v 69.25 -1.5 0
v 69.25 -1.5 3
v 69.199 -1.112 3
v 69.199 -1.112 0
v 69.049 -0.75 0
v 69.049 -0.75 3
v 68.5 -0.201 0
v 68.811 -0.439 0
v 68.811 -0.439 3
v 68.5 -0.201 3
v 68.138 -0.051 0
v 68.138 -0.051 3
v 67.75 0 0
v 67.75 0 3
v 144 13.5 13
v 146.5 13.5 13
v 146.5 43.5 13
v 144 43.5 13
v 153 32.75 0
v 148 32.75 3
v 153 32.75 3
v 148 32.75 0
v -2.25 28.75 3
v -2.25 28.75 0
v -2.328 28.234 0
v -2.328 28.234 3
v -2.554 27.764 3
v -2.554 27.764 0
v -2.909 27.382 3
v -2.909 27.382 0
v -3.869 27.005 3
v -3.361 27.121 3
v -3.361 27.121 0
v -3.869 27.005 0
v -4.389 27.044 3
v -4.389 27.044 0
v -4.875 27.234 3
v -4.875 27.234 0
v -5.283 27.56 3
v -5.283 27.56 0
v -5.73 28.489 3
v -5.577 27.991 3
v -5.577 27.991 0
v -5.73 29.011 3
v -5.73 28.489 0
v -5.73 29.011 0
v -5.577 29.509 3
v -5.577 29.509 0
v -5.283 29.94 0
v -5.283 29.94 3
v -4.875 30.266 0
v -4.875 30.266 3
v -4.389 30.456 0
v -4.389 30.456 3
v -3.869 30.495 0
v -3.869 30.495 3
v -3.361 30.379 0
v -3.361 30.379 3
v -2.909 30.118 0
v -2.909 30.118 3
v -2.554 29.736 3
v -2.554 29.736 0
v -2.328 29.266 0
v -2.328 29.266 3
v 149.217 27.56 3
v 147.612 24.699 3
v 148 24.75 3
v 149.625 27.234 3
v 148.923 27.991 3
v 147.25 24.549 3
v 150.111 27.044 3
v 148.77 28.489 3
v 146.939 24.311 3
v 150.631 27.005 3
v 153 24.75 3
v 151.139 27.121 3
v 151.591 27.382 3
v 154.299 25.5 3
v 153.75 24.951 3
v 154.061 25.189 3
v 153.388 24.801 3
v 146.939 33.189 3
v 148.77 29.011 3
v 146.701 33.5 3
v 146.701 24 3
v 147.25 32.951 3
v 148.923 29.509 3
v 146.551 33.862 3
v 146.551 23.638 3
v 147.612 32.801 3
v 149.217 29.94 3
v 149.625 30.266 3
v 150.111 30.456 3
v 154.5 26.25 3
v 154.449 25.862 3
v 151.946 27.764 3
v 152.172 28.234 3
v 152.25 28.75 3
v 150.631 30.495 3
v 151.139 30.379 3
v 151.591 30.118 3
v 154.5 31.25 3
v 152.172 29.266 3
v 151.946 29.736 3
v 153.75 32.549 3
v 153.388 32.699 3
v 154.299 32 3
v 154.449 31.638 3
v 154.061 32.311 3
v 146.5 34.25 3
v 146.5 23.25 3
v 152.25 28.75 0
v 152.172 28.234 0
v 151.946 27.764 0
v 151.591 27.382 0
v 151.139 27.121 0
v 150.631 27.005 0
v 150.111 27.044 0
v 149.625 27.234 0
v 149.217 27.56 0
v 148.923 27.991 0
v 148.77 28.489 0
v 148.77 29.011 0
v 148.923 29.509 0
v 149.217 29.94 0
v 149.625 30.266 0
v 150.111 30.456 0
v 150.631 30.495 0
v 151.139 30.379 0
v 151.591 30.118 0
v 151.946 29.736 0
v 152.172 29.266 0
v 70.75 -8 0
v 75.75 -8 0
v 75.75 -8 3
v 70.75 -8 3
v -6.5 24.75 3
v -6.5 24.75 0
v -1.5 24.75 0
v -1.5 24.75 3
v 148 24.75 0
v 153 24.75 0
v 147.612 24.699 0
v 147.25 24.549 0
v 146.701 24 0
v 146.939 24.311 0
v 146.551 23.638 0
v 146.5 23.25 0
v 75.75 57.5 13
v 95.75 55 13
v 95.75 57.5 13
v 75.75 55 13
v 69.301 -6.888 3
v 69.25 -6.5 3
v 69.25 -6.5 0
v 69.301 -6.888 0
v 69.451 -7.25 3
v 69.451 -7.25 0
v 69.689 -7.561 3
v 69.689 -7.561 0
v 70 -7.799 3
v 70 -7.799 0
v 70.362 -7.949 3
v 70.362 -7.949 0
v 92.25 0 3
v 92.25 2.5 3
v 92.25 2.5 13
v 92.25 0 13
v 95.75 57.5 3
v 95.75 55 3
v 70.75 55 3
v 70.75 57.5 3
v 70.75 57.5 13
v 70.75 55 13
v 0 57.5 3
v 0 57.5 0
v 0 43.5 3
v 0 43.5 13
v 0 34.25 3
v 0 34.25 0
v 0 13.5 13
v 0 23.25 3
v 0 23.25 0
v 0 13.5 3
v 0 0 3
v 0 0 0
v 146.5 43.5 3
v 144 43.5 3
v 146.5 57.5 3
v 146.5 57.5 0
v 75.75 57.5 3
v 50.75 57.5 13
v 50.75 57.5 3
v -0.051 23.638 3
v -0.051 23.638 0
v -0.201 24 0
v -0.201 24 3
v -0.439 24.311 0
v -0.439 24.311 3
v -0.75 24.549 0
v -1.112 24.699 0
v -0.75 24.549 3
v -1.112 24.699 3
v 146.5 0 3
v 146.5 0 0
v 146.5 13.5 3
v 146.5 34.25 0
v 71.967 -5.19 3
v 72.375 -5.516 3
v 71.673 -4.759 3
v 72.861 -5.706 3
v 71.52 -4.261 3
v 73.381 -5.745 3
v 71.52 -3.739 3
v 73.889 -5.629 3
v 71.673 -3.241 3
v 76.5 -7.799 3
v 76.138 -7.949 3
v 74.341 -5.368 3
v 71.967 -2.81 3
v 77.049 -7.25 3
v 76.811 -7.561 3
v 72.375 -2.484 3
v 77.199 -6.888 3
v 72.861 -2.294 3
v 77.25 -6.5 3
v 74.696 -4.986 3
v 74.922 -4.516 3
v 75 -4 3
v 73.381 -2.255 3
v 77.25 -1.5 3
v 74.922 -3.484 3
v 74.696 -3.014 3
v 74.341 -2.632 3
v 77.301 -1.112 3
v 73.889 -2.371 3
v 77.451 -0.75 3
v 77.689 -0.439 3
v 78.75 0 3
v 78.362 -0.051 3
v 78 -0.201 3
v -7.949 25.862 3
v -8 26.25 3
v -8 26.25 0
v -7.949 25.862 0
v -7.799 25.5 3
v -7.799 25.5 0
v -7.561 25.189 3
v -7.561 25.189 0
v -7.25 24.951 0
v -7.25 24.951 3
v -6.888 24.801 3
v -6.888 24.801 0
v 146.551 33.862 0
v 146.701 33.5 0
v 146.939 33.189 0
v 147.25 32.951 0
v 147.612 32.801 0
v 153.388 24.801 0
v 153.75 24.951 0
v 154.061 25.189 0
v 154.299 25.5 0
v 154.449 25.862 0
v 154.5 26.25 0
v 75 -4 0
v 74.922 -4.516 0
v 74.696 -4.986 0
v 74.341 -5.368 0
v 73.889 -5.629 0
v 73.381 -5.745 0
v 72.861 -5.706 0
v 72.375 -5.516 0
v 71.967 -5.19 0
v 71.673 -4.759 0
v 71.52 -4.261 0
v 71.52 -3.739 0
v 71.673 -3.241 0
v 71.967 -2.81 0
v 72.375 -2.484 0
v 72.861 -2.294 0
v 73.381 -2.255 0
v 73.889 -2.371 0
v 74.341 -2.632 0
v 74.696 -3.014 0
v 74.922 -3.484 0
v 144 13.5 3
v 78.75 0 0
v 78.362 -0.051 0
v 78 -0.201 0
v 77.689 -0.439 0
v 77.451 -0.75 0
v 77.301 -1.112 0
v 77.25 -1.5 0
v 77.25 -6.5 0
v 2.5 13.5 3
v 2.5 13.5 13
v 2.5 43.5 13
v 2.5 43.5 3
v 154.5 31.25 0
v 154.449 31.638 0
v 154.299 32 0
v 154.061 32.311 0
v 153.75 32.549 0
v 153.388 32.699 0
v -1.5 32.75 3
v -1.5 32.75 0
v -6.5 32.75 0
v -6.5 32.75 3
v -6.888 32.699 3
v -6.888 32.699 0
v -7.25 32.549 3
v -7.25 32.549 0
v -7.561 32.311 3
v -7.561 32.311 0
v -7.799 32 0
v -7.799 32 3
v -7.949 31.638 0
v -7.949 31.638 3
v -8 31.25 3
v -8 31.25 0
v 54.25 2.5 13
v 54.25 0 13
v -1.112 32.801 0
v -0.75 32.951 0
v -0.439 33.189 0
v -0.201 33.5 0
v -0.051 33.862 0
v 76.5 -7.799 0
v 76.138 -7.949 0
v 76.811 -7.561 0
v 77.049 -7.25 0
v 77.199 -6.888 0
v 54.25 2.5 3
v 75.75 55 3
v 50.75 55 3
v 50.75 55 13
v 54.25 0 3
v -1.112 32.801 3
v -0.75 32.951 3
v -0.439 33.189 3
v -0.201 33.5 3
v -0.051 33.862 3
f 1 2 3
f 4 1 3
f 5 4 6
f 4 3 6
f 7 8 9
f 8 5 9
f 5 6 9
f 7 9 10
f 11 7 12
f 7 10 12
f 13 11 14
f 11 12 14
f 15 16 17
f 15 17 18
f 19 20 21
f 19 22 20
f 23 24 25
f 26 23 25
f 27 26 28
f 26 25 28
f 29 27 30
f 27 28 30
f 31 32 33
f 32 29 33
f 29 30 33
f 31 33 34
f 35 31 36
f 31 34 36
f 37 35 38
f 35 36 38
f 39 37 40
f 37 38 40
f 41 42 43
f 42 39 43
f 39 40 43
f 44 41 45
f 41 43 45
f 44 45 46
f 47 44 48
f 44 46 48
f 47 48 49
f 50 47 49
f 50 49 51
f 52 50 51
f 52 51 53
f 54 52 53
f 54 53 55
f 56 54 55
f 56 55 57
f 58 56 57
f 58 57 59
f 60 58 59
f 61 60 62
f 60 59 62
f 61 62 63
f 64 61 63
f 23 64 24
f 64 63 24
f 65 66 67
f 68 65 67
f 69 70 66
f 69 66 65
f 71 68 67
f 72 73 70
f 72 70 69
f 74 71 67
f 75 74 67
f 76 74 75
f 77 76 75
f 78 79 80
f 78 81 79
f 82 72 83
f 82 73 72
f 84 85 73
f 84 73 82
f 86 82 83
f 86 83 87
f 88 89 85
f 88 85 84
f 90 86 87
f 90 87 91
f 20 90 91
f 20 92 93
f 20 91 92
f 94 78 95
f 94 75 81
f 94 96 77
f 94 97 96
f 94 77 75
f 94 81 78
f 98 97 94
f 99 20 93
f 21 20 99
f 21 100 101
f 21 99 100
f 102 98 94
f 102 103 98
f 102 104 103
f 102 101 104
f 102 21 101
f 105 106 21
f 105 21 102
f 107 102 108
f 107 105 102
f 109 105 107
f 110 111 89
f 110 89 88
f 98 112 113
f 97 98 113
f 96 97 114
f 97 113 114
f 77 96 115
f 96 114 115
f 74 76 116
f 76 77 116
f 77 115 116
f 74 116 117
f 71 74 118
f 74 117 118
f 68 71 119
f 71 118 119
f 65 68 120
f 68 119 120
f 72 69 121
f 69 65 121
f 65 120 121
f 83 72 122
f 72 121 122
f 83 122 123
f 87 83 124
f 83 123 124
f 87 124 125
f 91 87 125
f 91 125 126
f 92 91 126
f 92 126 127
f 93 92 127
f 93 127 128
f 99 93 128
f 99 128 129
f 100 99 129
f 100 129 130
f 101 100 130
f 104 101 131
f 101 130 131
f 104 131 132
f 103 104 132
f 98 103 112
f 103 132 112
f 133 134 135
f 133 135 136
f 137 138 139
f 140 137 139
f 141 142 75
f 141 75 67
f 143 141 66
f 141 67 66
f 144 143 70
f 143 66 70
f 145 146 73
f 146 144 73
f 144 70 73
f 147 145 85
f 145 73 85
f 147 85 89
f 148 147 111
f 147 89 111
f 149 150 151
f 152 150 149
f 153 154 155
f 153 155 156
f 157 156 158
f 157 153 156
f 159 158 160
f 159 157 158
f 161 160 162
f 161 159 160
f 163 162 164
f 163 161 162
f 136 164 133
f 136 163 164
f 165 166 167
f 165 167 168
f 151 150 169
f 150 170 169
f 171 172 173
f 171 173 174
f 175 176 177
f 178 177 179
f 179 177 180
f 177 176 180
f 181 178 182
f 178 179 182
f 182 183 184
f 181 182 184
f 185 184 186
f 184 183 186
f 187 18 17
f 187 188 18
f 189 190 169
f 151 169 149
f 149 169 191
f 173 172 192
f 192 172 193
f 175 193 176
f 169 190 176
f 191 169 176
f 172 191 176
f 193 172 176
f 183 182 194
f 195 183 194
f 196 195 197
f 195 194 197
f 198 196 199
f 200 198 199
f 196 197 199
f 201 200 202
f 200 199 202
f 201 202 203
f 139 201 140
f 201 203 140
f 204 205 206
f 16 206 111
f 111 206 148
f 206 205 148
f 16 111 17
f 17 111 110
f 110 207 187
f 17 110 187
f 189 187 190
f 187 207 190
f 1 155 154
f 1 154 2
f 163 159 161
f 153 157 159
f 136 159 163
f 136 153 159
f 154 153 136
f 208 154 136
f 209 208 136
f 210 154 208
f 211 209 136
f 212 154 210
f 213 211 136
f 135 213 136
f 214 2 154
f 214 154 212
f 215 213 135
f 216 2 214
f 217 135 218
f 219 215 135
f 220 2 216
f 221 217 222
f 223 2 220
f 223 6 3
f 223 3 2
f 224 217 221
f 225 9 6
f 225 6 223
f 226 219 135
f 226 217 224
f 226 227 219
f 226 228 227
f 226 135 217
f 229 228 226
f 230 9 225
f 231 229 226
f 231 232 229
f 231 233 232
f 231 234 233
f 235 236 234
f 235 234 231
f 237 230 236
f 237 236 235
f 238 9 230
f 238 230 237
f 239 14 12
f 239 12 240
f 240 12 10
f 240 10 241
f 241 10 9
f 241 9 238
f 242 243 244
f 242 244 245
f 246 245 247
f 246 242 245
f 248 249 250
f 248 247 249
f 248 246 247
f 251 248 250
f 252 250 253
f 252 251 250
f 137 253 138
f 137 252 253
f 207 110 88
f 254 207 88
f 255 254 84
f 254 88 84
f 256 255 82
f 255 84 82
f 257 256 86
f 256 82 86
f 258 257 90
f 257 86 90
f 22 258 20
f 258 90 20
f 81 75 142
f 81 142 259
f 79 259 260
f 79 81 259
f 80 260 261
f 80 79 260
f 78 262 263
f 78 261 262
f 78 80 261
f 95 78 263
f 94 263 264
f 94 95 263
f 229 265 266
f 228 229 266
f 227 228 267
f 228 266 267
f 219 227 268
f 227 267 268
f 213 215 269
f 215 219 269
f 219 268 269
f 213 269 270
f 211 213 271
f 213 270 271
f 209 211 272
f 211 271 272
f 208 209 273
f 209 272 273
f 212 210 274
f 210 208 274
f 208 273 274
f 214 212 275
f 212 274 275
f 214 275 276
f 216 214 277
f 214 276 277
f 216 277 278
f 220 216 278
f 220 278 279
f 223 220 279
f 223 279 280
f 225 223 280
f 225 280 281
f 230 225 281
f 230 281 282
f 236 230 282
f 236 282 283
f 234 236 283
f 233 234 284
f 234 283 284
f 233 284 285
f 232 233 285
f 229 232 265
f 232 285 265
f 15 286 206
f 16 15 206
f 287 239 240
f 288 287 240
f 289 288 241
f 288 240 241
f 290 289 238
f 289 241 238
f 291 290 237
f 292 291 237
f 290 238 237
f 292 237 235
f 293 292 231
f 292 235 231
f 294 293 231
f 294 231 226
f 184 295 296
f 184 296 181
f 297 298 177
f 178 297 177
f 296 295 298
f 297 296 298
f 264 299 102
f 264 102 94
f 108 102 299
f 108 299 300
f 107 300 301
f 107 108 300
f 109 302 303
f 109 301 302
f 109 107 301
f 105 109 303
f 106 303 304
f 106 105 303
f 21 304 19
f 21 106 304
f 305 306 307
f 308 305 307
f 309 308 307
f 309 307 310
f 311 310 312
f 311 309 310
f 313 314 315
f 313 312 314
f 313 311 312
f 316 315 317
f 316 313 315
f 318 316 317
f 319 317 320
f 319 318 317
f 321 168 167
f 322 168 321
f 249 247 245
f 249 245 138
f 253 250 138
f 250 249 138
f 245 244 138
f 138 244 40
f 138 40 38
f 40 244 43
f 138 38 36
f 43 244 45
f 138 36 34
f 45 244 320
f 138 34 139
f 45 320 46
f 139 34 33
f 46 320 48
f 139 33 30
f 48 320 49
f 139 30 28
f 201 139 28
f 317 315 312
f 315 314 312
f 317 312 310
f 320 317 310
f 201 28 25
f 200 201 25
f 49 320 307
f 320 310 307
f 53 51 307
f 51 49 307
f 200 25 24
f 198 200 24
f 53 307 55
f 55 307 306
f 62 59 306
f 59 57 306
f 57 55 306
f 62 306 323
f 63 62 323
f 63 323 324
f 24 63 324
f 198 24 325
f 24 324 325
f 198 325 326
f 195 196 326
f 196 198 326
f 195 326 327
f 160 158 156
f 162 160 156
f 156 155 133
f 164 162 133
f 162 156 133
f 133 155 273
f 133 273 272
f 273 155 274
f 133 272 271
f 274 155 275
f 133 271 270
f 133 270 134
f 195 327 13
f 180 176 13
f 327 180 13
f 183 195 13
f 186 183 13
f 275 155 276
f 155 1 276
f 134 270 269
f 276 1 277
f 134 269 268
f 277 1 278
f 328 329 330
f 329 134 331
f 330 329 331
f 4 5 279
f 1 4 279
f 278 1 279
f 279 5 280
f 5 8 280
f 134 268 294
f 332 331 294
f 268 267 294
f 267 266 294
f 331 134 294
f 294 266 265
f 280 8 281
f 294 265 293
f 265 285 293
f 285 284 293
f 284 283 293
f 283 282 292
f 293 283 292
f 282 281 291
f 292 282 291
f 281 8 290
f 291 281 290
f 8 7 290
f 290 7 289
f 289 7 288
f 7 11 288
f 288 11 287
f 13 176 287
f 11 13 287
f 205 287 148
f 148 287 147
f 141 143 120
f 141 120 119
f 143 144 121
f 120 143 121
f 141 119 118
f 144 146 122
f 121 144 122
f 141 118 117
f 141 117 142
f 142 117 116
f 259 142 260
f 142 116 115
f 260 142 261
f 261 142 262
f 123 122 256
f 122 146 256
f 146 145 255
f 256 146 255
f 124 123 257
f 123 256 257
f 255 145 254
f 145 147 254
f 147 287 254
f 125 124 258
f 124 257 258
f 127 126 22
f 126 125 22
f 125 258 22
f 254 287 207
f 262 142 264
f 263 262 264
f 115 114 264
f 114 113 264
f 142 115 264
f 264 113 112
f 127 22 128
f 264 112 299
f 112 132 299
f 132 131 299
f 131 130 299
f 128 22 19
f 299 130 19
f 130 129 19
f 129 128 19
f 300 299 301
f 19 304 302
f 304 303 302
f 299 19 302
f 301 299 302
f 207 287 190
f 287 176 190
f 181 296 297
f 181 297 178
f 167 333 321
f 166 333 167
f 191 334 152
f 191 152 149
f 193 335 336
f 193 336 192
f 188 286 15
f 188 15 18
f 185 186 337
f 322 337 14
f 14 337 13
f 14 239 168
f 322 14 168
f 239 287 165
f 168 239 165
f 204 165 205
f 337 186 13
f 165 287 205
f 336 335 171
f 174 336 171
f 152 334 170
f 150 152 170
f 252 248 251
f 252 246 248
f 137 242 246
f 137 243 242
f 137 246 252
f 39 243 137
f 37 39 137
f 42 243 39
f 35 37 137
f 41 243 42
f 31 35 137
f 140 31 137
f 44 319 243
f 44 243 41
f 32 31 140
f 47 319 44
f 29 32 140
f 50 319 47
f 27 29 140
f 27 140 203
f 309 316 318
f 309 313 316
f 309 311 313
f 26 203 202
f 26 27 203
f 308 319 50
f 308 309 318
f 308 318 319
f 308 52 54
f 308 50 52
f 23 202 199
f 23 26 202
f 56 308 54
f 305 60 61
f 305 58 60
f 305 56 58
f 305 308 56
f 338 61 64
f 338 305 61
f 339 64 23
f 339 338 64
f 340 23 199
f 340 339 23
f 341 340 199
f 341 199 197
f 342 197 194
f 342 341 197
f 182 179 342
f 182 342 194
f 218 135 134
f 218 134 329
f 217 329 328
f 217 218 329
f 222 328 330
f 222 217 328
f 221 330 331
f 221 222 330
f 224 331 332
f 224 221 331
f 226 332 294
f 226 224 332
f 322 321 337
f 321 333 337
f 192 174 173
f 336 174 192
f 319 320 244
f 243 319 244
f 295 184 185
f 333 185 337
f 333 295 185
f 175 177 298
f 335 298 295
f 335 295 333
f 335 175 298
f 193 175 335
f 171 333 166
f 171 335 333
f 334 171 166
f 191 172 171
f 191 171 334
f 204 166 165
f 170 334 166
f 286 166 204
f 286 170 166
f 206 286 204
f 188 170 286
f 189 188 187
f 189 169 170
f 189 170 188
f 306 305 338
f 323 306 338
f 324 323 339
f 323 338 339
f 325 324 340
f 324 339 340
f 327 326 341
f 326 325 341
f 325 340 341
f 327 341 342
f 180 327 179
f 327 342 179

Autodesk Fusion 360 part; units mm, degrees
sketch "Sketch2" plane through (0, 0, 0) normal (0, 0, 1) x (1, 0, 0)
  line L0 (0, 0) -> (146.5, 0)
  line L1 (146.5, 0) -> (146.5, 57.5)
  line L2 (146.5, 57.5) -> (0, 57.5)
  line L3 (0, 57.5) -> (0, 0)
  line L4 (69.25, 0) -> (77.25, 0)
  line L5 (77.25, 0) -> (77.25, -8)
  line L6 (77.25, -8) -> (69.25, -8)
  line L7 (69.25, -8) -> (69.25, 0)
  line L8 (146.5, 24.75) -> (146.5, 32.75)
  line L9 (146.5, 32.75) -> (154.5, 32.75)
  line L10 (154.5, 32.75) -> (154.5, 24.75)
  line L11 (154.5, 24.75) -> (146.5, 24.75)
  line L12 (73.25, 57.5) -> (73.25, 0) construction
  line L13 (146.5, 28.75) -> (154.5, 28.75) construction
  line L14 (150.5, 32.75) -> (150.5, 24.75) construction
  circle A0 centre (150.5, 28.75) radius 1.75
  line L15 (-8, 24.75) -> (0, 24.75)
  line L16 (-8, 32.75) -> (-8, 24.75)
  line L17 (0, 32.75) -> (-8, 32.75)
  circle A1 centre (-4, 28.75) radius 1.75
  line L18 (69.25, -4) -> (77.25, -4) construction
  line L19 (73.25, 0) -> (73.25, -8) construction
  circle A2 centre (73.25, -4) radius 1.75
  point P0 (73.25, 0)
  point P1 (146.5, 28.75)
  point P2 (-8, 28.75)
  dimension "d8" = 146.5
  dimension "d9" = 57.5
  dimension "d12" = 8
  dimension "d13" = 8
  dimension "d14" = 8
  dimension "d15" = 8
  dimension "d16" = 8
  dimension "d17" = 3.5
  dimension "d18" = 3.5
extrude "Extrude1" add sketch "Sketch2" along normal blind 3
fillet "Fillet1" radius 1.5 12 edges at (77.25, 0, 1.5) (77.25, -8, 1.5) (69.25, -8, 1.5) (69.25, 0, 1.5) (0, 24.75, 1.5) (-8, 24.75, 1.5) (-8, 32.75, 1.5) (0, 32.75, 1.5) (154.5, 32.75, 1.5) (146.5, 32.75, 1.5) (146.5, 24.75, 1.5) (154.5, 24.75, 1.5)
sketch "Sketch3" plane through (0, 0, 3) normal (0, 0, 1) x (-1, 0, 0)
  arc A0 (-153, -24.75) -> (-154.5, -26.25) centre (-153, -26.25) ccw
  line L0 (-154.5, -26.25) -> (-154.5, -31.25)
  arc A1 (-154.5, -31.25) -> (-153, -32.75) centre (-153, -31.25) ccw
  line L1 (-153, -32.75) -> (-148, -32.75)
  arc A2 (-146.5, -34.25) -> (-148, -32.75) centre (-148, -34.25) ccw
  line L2 (-146.5, -34.25) -> (-146.5, -57.5)
  line L3 (-146.5, -57.5) -> (0, -57.5)
  line L4 (0, -57.5) -> (0, -34.25)
  arc A3 (1.5, -32.75) -> (0, -34.25) centre (1.5, -34.25) ccw
  line L5 (1.5, -32.75) -> (6.5, -32.75)
  arc A4 (6.5, -32.75) -> (8, -31.25) centre (6.5, -31.25) ccw
  line L6 (8, -31.25) -> (8, -26.25)
  arc A5 (8, -26.25) -> (6.5, -24.75) centre (6.5, -26.25) ccw
  line L7 (6.5, -24.75) -> (1.5, -24.75)
  arc A6 (0, -23.25) -> (1.5, -24.75) centre (1.5, -23.25) ccw
  line L8 (0, -23.25) -> (0, 0)
  line L9 (0, 0) -> (-67.75, 0)
  arc A7 (-69.25, 1.5) -> (-67.75, 0) centre (-67.75, 1.5) ccw
  line L10 (-69.25, 1.5) -> (-69.25, 6.5)
  arc A8 (-69.25, 6.5) -> (-70.75, 8) centre (-70.75, 6.5) ccw
  line L11 (-70.75, 8) -> (-75.75, 8)
  arc A9 (-75.75, 8) -> (-77.25, 6.5) centre (-75.75, 6.5) ccw
  line L12 (-77.25, 6.5) -> (-77.25, 1.5)
  arc A10 (-78.75, 0) -> (-77.25, 1.5) centre (-78.75, 1.5) ccw
  line L13 (-78.75, 0) -> (-146.5, 0)
  line L14 (-146.5, 0) -> (-146.5, -23.25)
  arc A11 (-148, -24.75) -> (-146.5, -23.25) centre (-148, -23.25) ccw
  line L15 (-148, -24.75) -> (-153, -24.75)
  circle A12 centre (-150.5, -28.75) radius 1.75
  circle A13 centre (4, -28.75) radius 1.75
  circle A14 centre (-73.25, 4) radius 1.75
  line L16 (0, -2.5) -> (-146.5, -2.5) construction
  line L17 (-54.25, -2.5) -> (-92.25, -2.5)
  line L18 (-92.25, -2.5) -> (-92.25, 0)
  line L19 (-54.25, -2.5) -> (-54.25, 0)
  line L20 (-54.25, 0) -> (-92.25, 0)
  line L21 (-144, -57) -> (-144, 0) construction
  line L22 (-144, -13.5) -> (-144, -43.5)
  line L23 (-144, -43.5) -> (-146.5, -43.5)
  line L24 (-144, -13.5) -> (-146.5, -13.5)
  line L25 (-146.5, -13.5) -> (-146.5, -43.5)
  line L26 (-73.25, -57.5) -> (-73.25, 0) construction
  line L27 (-2.5, -13.5) -> (0, -13.5)
  line L28 (0, -13.5) -> (0, -43.5)
  line L29 (-2.5, -43.5) -> (0, -43.5)
  line L30 (-2.5, -13.5) -> (-2.5, -43.5)
  line L31 (0, -55) -> (-146.5, -55) construction
  line L32 (-50.75, -55) -> (-95.75, -55)
  line L33 (-95.75, -55) -> (-95.75, -57.5)
  line L34 (-50.75, -55) -> (-50.75, -57.5)
  line L35 (-50.75, -57.5) -> (-95.75, -57.5)
  line L36 (-70.75, -55) -> (-75.75, -55)
  line L37 (-75.75, -55) -> (-75.75, -57.5)
  line L38 (-75.75, -57.5) -> (-70.75, -57.5)
  line L39 (-70.75, -57.5) -> (-70.75, -55)
  point P0 (-73.25, -2.5)
  point P1 (-144, -28.5)
  point P2 (-73.25, -55)
  point P3 (-73.25, -55)
  dimension "d23" = 2.5
  dimension "d24" = 38
  dimension "d25" = 2.5
  dimension "d26" = 30
  dimension "d27" = 2.5
  dimension "d28" = 45
  dimension "d29" = 5
extrude "Extrude2" add sketch "Sketch3" along normal blind 10 contours L2 L14 L22 L23 L24 L25 | L9 L13 L17 L18 L19 L20 | L3 L32 L33 L35 L37 | L3 L32 L34 L35 L39 | L4 L8 L27 L28 L29 L30
equation "controller_length = 143 mm"
equation "controller_width = 54 mm"
equation "mount_hole_diameter = 3.5 mm"
equation "base_thickness = 3 mm"
equation "wall_thickness = 2.5 mm"
equation "give = 1 mm"
equation "d8 = total_length"
equation "d9 = total_width"
equation "total_length = controller_length + wall_thickness + give"
equation "total_width = controller_width + give + wall_thickness"
equation "d19 = base_thickness"
equation "d23 = wall_thickness"
equation "d25 = wall_thickness"
equation "d27 = wall_thickness"
